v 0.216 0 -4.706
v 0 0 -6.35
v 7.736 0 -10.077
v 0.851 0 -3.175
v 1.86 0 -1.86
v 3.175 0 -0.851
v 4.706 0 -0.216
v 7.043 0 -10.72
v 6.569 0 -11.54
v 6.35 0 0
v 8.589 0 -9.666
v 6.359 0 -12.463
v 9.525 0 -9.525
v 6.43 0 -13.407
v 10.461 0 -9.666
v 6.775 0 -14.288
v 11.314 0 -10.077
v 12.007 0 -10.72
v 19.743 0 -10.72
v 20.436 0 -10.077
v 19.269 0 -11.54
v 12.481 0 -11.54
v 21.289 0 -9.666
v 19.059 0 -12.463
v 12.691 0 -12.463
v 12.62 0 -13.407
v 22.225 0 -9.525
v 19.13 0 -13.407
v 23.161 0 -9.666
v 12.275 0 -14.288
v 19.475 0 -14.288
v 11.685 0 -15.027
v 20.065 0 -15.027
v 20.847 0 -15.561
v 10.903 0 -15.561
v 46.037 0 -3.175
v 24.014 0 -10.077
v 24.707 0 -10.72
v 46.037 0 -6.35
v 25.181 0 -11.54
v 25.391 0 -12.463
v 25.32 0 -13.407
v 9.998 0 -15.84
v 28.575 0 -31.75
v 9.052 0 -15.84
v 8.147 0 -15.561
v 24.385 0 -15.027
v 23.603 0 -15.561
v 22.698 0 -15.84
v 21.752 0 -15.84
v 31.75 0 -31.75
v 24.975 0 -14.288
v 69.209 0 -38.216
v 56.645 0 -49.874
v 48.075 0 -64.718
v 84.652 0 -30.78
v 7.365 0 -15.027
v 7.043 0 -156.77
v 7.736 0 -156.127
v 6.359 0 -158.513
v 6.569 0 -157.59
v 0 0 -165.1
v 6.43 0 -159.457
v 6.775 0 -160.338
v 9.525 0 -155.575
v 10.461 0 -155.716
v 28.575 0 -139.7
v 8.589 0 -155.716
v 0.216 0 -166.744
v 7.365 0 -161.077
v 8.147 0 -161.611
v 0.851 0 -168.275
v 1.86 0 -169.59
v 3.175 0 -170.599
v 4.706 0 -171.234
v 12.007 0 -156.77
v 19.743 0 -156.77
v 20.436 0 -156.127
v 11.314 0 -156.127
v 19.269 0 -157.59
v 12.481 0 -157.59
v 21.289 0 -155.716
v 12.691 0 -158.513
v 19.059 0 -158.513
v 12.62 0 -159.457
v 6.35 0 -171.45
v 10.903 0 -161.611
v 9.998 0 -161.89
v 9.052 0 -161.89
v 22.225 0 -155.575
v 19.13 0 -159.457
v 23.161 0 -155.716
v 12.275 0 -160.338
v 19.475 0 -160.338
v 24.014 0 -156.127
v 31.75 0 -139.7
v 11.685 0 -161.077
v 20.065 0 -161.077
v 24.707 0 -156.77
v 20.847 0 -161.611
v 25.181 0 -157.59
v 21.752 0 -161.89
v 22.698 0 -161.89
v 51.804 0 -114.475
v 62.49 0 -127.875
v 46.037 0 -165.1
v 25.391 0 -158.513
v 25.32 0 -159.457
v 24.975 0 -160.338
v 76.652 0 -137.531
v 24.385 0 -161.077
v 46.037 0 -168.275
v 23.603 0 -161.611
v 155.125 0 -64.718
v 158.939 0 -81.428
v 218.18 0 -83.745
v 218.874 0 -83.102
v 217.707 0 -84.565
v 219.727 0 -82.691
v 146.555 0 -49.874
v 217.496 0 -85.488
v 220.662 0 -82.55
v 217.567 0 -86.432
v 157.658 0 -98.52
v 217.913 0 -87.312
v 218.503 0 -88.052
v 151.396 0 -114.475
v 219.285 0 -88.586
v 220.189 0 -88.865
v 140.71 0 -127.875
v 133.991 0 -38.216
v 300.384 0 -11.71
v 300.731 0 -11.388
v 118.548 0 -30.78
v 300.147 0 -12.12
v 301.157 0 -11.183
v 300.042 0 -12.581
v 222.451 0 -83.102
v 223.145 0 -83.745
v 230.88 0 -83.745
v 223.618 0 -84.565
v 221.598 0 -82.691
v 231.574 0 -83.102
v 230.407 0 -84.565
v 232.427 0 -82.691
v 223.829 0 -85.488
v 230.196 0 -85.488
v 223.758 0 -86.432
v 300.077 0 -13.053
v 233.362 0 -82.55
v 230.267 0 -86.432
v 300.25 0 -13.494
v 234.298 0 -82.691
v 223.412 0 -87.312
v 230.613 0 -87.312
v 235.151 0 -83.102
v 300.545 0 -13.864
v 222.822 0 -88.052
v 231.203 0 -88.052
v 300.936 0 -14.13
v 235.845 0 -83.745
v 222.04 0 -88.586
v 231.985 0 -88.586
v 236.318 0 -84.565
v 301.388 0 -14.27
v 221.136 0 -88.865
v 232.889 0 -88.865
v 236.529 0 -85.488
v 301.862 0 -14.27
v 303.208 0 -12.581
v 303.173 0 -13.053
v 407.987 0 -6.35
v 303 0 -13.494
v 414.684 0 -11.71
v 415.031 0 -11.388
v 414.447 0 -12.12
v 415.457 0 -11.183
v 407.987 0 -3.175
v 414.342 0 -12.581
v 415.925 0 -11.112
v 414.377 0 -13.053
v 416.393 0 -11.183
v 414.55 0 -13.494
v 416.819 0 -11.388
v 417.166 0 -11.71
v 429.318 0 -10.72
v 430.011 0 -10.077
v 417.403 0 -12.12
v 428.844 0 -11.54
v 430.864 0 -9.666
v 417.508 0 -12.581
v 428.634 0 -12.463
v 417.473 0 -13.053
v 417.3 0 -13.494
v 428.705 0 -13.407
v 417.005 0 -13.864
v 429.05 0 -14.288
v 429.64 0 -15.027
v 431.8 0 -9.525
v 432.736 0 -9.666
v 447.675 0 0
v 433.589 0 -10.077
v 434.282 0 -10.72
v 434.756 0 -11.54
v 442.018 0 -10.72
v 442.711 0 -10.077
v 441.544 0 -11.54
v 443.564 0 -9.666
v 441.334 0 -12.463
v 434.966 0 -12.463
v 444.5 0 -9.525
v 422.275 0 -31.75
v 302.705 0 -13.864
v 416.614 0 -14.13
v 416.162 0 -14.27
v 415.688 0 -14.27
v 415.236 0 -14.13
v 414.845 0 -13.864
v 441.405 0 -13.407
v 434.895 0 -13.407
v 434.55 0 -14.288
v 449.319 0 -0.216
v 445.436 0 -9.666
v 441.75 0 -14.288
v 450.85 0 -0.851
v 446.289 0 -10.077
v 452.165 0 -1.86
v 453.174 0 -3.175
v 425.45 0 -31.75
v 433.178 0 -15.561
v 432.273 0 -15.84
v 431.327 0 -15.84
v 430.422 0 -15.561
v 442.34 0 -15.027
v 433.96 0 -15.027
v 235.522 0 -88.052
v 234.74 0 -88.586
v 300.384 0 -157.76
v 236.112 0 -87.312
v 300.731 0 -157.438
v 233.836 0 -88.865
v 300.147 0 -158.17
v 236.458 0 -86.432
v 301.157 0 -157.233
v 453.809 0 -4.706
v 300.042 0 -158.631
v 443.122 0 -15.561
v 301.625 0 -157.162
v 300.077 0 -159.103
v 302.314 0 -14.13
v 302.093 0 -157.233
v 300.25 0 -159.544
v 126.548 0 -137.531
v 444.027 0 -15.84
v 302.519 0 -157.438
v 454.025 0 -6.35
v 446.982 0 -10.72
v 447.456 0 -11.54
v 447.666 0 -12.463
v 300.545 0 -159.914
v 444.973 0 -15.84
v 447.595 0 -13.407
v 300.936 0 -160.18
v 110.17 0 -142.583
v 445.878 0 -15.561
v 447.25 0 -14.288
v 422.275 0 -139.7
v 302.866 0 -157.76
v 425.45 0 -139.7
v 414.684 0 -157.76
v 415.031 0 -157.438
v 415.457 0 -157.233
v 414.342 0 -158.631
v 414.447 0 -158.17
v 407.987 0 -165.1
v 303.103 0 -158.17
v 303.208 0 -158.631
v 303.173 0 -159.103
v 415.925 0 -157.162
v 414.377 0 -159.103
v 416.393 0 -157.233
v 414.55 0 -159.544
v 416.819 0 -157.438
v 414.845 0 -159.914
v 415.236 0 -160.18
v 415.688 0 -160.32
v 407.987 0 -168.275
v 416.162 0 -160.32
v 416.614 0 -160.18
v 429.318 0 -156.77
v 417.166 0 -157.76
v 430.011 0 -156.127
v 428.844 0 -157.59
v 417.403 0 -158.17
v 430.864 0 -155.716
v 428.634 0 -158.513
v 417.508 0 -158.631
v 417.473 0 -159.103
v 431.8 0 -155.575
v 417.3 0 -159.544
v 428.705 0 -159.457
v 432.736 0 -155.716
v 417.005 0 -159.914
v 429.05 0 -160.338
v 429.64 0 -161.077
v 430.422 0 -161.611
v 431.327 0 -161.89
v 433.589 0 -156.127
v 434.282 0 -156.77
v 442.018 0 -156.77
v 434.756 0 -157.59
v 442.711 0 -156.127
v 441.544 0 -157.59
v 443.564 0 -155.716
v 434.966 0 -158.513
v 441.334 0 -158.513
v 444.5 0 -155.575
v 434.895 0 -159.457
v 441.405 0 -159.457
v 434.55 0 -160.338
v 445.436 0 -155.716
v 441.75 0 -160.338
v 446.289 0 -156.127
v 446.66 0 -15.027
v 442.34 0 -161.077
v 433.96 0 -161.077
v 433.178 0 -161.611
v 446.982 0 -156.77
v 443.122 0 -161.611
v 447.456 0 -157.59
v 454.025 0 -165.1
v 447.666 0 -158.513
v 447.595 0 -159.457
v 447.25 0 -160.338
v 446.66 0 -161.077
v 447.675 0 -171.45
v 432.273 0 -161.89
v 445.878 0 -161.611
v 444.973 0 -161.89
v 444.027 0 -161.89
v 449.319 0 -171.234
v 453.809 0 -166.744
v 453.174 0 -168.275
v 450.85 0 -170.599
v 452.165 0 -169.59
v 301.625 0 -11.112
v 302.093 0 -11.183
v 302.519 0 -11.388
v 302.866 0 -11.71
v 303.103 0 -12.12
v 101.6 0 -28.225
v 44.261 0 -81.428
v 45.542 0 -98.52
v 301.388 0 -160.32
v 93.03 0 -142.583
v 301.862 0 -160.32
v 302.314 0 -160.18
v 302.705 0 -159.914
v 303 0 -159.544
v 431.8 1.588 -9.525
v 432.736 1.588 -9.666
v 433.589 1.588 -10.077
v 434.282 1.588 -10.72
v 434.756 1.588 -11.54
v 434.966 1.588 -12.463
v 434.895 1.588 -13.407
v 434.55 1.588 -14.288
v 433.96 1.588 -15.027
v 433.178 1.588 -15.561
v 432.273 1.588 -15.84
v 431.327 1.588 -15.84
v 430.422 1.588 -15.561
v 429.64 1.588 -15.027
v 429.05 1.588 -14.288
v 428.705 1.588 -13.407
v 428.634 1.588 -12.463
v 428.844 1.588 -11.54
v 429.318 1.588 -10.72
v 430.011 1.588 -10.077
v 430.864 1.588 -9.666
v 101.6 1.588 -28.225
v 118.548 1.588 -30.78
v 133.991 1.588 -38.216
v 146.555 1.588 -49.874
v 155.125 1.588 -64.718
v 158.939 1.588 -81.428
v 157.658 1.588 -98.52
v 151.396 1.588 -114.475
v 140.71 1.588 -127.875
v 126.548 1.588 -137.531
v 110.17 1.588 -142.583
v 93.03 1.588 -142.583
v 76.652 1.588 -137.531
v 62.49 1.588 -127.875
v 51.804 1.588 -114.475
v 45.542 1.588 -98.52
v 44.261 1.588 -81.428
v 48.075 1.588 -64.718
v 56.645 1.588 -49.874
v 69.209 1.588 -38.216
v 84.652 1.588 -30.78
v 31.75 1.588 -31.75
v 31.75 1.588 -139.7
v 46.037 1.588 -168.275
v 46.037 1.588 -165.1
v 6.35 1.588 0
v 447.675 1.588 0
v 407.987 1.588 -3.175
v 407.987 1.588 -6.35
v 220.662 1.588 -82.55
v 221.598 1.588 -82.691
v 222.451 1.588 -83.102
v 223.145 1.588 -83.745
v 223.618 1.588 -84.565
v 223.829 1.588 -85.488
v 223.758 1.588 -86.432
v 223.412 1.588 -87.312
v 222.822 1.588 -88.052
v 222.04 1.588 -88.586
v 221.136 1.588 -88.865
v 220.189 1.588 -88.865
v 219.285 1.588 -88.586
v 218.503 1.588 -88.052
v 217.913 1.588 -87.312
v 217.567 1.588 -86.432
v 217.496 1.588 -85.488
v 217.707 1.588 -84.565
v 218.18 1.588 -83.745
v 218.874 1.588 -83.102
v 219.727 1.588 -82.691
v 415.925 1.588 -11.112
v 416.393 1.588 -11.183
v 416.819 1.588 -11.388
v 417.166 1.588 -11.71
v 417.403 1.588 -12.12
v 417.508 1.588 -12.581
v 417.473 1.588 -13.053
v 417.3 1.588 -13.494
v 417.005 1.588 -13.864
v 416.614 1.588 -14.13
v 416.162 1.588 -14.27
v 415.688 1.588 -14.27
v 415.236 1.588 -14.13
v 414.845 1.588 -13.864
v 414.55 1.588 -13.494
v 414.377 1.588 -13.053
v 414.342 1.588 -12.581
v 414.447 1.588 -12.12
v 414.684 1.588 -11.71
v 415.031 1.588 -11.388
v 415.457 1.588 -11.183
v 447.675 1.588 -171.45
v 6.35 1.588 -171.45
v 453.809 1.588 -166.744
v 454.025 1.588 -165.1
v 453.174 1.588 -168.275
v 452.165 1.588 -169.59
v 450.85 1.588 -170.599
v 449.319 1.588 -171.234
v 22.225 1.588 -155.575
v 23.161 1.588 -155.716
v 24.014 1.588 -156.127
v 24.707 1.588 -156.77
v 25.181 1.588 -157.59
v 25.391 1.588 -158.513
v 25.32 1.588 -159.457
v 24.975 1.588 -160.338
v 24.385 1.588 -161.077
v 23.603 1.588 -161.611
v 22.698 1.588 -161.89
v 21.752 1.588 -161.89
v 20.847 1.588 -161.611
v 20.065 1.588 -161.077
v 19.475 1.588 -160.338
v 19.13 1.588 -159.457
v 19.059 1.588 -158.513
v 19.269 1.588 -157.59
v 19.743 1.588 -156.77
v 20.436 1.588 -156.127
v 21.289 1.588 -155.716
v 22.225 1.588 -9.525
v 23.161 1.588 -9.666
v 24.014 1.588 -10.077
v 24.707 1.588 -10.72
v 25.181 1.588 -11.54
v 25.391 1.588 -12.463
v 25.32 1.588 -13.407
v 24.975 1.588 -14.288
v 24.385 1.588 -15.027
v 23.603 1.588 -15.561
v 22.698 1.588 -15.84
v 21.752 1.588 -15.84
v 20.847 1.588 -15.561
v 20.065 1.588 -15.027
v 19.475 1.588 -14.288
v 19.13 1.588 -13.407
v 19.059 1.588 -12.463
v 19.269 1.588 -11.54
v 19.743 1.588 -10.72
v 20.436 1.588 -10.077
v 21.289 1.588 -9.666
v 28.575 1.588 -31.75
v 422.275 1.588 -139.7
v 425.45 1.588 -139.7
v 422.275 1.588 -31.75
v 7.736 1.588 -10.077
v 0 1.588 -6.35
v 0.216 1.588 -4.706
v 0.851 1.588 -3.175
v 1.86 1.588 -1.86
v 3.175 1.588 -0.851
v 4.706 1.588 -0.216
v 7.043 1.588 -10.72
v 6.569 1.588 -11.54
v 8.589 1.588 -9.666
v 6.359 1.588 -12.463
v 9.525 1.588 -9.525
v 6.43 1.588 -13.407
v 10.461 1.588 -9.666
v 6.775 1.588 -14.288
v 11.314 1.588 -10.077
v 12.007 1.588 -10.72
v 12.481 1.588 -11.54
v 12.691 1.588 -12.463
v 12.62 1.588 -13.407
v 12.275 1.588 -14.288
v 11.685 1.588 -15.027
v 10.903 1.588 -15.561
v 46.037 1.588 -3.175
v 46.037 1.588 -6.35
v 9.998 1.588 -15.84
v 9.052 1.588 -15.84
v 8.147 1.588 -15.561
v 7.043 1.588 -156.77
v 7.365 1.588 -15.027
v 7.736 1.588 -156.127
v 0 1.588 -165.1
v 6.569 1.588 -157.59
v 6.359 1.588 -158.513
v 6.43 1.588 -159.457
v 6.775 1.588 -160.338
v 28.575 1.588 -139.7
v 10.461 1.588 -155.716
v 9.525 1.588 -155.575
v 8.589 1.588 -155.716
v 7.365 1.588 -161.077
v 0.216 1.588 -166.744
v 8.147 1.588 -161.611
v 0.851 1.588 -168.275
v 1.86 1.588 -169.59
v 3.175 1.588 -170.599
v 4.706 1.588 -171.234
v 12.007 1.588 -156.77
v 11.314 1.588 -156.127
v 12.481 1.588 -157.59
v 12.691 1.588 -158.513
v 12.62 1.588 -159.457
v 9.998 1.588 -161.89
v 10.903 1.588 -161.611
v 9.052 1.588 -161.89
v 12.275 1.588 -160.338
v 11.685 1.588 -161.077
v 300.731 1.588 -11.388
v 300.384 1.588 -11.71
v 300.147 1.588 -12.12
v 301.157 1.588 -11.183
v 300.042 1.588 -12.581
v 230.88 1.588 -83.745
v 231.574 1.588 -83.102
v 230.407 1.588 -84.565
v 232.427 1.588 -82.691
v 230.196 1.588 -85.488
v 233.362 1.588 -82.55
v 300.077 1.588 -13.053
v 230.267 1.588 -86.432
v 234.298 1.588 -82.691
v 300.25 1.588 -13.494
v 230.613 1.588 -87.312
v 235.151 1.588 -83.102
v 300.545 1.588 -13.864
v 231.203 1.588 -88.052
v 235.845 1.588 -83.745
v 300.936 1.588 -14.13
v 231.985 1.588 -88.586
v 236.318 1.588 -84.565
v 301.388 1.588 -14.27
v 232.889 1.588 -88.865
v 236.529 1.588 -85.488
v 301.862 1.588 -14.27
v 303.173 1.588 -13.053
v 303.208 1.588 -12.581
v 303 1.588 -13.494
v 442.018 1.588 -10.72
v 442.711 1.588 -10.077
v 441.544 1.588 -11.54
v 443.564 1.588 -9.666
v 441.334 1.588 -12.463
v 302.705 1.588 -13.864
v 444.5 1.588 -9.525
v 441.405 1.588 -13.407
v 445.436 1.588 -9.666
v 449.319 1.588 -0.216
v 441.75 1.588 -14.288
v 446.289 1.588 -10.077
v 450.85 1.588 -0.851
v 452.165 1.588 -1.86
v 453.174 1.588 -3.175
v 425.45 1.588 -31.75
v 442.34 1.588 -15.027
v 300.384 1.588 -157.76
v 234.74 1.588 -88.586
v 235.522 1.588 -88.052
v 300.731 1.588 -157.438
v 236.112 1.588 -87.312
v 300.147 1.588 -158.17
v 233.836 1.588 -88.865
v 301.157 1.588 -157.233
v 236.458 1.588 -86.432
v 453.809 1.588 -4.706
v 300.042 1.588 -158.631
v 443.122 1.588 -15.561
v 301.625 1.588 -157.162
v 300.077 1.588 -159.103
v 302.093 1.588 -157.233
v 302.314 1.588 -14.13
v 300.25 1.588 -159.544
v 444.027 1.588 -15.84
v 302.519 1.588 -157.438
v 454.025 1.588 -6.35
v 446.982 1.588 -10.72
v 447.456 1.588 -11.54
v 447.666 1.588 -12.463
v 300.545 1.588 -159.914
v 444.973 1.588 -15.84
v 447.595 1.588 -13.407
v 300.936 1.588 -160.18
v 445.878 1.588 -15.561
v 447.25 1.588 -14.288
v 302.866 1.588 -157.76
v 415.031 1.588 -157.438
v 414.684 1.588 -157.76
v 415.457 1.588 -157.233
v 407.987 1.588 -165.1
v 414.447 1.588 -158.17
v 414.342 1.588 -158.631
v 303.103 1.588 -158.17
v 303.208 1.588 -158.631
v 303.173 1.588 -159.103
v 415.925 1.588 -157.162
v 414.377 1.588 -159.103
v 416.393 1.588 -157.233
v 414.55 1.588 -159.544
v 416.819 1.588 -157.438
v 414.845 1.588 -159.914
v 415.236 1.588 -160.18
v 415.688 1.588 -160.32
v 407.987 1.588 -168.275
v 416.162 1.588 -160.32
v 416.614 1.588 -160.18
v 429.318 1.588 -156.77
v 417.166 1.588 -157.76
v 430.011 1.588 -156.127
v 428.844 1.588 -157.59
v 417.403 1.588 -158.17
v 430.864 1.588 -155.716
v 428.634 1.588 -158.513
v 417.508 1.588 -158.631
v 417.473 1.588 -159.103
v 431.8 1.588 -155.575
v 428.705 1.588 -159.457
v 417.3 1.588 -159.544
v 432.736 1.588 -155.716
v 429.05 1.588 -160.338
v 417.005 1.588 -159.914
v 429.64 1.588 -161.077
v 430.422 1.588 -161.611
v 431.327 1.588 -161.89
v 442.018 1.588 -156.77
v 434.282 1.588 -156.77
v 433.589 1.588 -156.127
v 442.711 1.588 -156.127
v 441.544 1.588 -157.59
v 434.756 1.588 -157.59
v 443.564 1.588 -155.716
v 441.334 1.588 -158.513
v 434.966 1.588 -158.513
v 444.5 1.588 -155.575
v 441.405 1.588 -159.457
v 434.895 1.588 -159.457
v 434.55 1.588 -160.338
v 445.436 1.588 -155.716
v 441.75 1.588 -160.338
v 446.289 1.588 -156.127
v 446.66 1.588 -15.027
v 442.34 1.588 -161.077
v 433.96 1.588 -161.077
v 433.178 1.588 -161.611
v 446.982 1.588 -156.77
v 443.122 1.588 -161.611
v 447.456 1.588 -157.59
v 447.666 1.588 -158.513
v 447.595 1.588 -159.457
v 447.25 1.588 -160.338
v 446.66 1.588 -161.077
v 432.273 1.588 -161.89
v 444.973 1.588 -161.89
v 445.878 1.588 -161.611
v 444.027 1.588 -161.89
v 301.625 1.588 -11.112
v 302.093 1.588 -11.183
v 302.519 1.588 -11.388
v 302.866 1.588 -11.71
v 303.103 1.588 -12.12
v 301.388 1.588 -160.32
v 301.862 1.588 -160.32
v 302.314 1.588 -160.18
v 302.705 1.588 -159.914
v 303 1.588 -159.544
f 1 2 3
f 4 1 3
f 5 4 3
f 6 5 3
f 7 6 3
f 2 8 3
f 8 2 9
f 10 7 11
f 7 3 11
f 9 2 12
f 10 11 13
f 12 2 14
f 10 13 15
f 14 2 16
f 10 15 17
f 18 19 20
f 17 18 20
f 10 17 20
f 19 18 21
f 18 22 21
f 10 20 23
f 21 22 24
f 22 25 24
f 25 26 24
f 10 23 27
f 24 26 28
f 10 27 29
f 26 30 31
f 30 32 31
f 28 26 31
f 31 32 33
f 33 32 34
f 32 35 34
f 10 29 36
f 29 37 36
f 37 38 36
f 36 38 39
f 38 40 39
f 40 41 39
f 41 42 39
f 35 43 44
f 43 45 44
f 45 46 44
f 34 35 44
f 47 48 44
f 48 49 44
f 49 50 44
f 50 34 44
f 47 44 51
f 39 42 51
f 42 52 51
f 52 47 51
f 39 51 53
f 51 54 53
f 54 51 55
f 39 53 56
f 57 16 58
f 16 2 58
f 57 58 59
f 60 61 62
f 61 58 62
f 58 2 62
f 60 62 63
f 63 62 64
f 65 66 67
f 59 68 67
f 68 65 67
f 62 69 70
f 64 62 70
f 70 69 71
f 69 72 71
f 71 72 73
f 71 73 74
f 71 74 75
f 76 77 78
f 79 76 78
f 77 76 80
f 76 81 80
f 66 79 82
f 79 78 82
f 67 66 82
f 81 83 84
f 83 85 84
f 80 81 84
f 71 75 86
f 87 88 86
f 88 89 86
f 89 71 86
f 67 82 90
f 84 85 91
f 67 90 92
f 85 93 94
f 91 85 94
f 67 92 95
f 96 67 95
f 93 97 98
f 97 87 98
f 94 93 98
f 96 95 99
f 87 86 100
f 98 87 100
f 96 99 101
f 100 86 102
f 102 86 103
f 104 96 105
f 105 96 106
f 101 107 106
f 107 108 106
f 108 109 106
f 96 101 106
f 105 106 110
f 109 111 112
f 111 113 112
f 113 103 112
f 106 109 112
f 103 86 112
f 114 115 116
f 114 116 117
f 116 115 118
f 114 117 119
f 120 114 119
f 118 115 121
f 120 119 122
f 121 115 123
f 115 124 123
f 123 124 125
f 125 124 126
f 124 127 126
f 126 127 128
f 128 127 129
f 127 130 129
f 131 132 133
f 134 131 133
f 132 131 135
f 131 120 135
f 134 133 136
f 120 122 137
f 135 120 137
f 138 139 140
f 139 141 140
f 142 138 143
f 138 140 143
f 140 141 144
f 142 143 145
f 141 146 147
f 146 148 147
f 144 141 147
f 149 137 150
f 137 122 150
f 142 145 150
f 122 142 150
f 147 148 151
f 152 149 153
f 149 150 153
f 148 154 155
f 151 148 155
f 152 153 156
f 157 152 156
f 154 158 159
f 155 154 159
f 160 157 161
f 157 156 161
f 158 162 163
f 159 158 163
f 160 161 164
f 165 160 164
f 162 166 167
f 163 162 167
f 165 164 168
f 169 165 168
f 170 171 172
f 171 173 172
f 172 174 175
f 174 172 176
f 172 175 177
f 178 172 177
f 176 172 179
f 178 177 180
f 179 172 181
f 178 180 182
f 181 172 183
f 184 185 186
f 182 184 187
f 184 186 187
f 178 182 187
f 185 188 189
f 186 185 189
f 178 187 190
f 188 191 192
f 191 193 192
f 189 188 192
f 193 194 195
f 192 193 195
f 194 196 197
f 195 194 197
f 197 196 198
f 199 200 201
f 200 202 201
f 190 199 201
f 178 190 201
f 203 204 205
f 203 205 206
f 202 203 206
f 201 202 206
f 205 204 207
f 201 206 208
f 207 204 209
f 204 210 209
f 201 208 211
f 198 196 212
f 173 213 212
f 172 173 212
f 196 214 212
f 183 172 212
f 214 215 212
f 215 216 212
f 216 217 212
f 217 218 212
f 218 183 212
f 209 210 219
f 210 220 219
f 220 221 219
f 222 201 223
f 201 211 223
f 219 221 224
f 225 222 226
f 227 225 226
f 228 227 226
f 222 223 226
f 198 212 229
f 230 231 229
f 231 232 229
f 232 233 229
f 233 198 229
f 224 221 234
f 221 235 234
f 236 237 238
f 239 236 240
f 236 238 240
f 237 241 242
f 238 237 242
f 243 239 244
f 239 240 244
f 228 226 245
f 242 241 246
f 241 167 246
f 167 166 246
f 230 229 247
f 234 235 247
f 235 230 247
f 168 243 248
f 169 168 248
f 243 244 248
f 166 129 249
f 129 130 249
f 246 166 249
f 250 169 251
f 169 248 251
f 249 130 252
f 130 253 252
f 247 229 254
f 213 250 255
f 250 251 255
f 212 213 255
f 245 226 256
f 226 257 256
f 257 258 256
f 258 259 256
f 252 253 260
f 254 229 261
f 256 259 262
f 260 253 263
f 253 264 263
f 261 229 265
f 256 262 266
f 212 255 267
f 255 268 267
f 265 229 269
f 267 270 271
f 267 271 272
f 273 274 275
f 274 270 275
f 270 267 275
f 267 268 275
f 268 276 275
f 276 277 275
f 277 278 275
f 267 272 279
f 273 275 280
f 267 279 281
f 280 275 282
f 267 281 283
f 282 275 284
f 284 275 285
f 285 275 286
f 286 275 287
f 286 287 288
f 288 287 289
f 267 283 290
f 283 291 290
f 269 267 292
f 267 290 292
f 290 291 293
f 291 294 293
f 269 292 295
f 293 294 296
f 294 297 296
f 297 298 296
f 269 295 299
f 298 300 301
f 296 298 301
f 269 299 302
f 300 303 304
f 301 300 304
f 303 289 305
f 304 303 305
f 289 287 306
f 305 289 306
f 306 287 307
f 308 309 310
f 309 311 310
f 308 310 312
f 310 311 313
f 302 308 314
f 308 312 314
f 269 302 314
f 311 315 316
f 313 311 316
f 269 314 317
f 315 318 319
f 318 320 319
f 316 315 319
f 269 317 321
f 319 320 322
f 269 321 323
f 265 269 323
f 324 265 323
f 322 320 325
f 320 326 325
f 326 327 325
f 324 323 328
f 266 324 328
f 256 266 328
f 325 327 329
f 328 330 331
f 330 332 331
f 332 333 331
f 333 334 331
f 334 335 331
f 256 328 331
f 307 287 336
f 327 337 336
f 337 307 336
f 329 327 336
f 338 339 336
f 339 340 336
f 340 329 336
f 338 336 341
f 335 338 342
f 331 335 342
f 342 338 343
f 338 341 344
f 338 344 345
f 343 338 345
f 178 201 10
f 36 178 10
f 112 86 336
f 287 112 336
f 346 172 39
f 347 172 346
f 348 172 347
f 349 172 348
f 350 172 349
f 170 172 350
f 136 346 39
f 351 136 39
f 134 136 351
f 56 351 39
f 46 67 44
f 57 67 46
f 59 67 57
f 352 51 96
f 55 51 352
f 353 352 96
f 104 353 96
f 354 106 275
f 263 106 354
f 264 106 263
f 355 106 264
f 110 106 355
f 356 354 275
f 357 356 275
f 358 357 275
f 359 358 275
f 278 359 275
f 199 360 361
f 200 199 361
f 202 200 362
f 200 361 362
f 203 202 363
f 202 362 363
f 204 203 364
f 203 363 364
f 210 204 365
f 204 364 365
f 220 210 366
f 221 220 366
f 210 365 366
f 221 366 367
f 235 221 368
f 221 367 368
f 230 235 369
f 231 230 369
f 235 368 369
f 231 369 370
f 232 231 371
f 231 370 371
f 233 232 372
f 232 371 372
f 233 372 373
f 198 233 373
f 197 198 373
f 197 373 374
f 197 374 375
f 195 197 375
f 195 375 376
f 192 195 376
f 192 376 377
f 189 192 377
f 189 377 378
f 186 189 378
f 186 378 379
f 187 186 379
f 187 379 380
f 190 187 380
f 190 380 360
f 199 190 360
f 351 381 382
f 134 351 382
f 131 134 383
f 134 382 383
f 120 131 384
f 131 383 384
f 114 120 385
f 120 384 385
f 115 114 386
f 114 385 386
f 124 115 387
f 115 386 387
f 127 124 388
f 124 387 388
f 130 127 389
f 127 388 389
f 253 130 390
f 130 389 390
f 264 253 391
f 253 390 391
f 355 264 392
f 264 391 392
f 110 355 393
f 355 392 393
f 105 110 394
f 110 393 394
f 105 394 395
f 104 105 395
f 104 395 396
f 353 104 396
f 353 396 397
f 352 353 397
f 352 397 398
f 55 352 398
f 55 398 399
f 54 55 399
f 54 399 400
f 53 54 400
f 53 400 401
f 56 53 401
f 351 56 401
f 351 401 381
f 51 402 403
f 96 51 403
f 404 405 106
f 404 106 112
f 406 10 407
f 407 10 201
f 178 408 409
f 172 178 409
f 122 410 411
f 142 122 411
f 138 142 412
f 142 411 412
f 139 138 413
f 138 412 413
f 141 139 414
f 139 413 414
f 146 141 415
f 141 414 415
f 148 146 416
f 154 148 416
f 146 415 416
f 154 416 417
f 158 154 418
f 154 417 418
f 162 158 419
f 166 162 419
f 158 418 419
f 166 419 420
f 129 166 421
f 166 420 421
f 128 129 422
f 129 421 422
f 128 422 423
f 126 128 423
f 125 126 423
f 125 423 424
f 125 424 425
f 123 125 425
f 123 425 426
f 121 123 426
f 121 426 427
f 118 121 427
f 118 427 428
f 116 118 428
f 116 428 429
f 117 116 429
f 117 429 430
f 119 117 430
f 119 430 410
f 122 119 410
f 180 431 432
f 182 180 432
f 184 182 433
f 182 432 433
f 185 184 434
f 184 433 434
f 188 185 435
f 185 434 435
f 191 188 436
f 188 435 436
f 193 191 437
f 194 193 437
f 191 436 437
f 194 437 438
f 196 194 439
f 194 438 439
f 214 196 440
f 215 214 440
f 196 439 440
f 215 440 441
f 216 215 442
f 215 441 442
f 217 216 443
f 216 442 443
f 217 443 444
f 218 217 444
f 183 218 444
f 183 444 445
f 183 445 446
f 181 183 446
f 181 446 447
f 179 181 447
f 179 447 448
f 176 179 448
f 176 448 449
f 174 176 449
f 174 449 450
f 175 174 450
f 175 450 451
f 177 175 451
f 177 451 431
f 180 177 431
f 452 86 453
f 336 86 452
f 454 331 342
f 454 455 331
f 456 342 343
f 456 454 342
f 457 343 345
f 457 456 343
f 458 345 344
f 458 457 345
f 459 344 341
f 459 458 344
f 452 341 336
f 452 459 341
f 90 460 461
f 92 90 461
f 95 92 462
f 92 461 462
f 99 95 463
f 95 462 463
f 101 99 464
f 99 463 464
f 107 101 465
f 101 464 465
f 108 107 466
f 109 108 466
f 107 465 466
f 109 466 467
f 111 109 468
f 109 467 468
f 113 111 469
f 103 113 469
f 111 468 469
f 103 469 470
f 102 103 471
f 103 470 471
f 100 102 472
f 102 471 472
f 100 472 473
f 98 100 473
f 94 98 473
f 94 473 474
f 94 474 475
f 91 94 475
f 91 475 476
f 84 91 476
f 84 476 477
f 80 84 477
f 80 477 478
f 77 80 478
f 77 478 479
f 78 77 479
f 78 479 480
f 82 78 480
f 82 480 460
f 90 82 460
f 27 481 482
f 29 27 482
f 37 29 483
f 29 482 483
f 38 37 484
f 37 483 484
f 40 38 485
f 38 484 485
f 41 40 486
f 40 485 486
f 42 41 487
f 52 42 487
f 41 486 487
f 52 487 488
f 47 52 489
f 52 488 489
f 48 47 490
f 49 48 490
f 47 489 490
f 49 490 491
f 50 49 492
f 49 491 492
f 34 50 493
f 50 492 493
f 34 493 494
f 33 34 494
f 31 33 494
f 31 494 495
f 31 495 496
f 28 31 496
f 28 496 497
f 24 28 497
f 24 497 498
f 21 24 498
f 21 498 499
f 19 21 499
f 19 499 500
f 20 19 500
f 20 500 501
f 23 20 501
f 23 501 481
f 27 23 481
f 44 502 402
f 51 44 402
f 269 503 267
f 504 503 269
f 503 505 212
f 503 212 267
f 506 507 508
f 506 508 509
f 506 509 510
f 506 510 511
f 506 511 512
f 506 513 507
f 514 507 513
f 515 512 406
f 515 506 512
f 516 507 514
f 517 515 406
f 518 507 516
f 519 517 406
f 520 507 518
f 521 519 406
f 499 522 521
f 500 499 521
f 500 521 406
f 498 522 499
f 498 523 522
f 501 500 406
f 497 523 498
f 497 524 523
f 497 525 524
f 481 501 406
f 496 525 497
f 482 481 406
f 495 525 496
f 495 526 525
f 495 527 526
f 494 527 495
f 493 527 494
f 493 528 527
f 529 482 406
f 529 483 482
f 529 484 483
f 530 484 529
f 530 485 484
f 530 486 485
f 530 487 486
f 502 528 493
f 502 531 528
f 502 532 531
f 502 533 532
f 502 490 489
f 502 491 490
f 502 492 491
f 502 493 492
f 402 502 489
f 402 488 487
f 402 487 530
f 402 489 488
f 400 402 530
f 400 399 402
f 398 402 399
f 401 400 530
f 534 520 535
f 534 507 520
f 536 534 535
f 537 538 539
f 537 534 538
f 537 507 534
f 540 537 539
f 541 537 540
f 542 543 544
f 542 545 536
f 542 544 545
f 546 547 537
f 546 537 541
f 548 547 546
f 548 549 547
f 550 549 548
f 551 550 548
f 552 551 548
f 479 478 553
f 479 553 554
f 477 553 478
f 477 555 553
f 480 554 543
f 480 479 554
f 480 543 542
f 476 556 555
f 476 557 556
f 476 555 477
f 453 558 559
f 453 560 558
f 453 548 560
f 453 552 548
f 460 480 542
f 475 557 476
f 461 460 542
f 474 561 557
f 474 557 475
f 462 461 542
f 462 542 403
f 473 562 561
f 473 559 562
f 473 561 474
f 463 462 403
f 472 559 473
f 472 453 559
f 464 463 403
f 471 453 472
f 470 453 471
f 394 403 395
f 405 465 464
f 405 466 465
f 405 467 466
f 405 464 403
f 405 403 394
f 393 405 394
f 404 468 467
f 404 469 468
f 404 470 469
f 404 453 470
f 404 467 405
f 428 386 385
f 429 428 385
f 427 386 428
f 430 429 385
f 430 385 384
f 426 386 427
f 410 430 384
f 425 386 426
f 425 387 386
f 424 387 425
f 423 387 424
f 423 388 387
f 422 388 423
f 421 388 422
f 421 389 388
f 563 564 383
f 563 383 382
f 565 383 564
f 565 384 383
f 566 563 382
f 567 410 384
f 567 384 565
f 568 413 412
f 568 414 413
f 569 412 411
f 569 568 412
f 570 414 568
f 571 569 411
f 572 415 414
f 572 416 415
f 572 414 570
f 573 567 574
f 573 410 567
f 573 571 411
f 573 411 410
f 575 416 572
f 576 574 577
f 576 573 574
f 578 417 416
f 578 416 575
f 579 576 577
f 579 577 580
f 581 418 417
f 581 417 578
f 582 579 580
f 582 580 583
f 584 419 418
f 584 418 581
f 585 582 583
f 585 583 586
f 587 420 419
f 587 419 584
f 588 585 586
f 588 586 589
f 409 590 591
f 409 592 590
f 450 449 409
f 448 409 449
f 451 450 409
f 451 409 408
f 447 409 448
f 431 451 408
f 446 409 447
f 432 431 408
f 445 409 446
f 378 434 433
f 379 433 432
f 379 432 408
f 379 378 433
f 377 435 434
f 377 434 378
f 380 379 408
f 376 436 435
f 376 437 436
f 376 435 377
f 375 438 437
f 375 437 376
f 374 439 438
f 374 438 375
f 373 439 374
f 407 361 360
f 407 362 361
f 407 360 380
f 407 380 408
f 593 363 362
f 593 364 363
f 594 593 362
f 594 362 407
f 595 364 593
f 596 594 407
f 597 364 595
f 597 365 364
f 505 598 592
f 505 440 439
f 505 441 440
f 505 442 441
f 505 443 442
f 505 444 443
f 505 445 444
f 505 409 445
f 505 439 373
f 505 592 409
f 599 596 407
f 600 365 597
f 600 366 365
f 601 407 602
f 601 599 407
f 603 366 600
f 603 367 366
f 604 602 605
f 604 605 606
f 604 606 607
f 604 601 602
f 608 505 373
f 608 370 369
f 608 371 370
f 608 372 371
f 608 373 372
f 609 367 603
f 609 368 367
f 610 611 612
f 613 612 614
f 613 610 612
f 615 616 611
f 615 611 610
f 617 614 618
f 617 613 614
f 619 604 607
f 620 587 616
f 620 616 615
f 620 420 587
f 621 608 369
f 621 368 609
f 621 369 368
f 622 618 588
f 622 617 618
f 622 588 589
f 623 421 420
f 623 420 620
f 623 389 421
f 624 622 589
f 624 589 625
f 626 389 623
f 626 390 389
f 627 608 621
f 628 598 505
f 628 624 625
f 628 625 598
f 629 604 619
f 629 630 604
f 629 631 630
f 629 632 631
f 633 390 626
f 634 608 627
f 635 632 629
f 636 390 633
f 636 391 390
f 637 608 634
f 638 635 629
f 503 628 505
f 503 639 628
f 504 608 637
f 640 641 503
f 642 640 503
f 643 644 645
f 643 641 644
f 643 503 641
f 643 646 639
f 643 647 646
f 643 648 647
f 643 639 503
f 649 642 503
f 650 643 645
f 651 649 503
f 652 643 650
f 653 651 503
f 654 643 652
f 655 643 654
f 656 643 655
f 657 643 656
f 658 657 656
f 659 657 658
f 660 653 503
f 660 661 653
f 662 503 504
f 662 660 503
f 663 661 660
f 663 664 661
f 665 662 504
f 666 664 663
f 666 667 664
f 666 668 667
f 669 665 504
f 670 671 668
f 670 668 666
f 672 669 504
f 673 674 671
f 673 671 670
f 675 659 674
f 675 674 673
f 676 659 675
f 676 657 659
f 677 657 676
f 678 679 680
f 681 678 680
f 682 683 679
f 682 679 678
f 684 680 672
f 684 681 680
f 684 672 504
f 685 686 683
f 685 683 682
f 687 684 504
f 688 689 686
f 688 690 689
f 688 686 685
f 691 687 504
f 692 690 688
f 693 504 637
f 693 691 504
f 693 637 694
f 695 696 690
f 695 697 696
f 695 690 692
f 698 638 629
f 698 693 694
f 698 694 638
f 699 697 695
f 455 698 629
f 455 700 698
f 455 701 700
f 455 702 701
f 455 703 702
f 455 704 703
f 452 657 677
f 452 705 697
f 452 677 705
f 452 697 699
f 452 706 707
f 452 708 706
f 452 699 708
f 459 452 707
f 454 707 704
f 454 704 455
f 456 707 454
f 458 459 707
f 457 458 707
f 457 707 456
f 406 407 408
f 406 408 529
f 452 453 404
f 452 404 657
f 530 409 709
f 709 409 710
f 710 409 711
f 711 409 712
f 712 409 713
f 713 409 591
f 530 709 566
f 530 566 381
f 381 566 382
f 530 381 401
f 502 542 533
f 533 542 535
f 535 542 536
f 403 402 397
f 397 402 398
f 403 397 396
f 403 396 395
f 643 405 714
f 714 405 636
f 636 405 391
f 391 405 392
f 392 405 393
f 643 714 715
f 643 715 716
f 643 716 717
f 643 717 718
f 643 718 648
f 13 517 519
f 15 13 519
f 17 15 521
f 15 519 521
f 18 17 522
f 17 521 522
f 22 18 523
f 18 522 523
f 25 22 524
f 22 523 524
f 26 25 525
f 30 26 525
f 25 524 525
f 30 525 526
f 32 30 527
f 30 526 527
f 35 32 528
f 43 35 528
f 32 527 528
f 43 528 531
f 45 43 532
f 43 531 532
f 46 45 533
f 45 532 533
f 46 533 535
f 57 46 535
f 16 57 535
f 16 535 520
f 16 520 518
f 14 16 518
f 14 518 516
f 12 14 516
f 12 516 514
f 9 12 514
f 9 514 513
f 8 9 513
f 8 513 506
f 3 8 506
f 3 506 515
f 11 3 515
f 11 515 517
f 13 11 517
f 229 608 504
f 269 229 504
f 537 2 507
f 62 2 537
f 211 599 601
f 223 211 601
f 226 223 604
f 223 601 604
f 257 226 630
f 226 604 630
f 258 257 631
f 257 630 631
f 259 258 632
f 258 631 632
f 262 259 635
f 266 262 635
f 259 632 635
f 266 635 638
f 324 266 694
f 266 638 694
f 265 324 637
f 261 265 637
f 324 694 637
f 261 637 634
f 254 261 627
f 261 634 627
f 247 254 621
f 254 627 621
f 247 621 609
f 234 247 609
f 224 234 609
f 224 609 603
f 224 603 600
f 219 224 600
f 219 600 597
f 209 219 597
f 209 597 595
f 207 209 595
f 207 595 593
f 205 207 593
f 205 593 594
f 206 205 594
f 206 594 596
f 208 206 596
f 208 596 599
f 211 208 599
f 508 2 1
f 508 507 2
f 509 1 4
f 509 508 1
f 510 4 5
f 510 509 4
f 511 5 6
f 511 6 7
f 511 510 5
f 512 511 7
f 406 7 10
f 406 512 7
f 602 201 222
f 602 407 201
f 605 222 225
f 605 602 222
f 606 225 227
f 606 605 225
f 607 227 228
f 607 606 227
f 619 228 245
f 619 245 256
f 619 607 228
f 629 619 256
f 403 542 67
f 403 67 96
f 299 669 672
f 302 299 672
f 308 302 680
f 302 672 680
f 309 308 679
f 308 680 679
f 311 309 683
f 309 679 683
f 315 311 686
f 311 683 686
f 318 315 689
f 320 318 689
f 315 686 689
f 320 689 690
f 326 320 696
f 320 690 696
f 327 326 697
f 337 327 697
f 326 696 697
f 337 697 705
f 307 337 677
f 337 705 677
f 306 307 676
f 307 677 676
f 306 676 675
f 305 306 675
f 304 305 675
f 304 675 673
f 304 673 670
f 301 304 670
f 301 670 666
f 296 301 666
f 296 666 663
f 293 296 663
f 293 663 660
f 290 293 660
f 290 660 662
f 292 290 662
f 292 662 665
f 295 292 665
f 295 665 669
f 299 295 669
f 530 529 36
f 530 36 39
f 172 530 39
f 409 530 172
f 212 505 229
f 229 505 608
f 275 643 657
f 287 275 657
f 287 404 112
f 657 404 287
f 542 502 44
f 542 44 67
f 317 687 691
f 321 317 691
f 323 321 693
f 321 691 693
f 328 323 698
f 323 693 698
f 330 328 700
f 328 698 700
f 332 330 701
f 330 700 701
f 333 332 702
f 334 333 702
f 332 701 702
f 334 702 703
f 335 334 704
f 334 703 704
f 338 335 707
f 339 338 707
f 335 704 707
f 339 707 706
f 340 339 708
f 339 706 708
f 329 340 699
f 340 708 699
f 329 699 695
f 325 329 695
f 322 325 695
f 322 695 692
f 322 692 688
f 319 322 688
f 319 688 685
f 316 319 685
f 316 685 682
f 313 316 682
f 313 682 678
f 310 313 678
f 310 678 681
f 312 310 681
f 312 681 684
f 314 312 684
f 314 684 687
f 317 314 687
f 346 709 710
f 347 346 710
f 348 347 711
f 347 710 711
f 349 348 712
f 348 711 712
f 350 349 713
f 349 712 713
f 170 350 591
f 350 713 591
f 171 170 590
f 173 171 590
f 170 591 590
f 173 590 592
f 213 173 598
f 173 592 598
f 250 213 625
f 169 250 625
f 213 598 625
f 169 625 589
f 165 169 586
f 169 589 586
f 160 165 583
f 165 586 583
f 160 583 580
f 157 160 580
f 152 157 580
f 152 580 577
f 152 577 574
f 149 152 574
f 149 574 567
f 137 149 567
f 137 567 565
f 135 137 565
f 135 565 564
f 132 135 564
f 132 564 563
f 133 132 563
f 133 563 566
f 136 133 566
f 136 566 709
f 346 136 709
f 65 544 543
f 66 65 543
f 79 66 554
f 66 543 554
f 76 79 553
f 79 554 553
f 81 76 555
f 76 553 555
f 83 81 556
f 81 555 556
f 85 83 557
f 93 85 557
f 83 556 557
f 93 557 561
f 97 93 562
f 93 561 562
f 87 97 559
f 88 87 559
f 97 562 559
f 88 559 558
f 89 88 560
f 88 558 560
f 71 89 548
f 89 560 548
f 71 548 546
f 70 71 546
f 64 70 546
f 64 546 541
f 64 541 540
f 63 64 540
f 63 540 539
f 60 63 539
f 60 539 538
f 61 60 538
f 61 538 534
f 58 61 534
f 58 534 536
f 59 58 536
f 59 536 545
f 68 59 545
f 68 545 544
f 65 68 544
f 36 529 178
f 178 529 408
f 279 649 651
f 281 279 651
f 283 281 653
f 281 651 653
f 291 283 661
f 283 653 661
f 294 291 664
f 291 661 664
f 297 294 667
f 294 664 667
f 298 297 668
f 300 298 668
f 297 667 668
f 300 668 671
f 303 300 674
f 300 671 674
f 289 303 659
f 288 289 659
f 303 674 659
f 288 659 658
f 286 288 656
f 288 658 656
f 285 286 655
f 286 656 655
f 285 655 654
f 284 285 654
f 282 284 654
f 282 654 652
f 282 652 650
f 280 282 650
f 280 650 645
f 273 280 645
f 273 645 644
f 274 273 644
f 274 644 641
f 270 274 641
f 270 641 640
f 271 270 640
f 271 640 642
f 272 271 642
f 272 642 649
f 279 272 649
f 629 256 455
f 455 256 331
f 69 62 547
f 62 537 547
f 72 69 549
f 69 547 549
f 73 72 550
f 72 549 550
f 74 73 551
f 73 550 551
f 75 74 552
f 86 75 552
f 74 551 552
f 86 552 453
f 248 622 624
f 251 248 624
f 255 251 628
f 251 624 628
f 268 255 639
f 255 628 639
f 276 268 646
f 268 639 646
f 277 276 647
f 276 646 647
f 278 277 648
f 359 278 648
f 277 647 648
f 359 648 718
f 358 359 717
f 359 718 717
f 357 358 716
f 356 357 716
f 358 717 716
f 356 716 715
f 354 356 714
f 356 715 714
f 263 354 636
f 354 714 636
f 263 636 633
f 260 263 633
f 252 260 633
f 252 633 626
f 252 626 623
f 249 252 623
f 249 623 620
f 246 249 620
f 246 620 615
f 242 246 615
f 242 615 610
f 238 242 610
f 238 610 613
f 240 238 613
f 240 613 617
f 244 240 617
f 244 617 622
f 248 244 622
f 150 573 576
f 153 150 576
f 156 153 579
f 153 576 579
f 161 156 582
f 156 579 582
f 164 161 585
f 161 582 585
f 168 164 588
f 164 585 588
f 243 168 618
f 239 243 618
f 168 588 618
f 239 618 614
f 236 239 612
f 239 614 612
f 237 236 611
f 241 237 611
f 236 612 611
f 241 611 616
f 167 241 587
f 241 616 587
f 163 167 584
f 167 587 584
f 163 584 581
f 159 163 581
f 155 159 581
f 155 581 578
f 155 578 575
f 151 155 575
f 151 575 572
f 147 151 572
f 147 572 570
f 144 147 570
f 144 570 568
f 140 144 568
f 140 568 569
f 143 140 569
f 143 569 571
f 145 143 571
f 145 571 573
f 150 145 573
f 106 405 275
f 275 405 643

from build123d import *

# Parameters (mm, degrees)
SKETCH1_W           = 454.025
SKETCH1_H           = 171.45
BOSS_EXTRUDE1_DEPTH = 1.5875
FILLET1_R           = 6.35
SKETCH3_W           = 361.95
SKETCH3_H           = 3.175
SKETCH3_W_2         = 3.175
SKETCH3_H_2         = 107.95
CUT_EXTRUDE1_DEPTH  = 486.320845711
SKETCH4_R           = 3.175
CUT_EXTRUDE2_DEPTH  = 486.320845711
SKETCH6_R           = 1.5875
CUT_EXTRUDE3_DEPTH  = 486.320845711
SKETCH7_R           = 57.5
CUT_EXTRUDE4_DEPTH  = 486.320845711


with BuildPart() as part:
    # Sketch1 → Boss-Extrude1 (new body)
    with BuildSketch(Plane(origin=(0, 0, 0), x_dir=(1, 0, 0), z_dir=(0, 1, 0))):
        with Locations((227.0125, 85.725)):
            Rectangle(SKETCH1_W, SKETCH1_H)
    extrude(amount=BOSS_EXTRUDE1_DEPTH)

    # Fillet1
    fillet1_edges = [part.edges().sort_by_distance(p)[0] for p in [
        (0, 0.79375, -171.45),
        (454.025, 0.79375, -171.45),
        (454.025, 0.79375, 0),
        (0, 0.79375, 0),
    ]]
    fillet(fillet1_edges, radius=FILLET1_R)

    # Sketch3 → Cut-Extrude1 (cut, through all)
    with BuildSketch(Plane(origin=(0, 1.5875, 0), x_dir=(1, 0, 0), z_dir=(0, 1, 0))):
        with Locations((227.0125, 166.6875)):
            Rectangle(SKETCH3_W, SKETCH3_H)
        with Locations((30.1625, 85.725)):
            Rectangle(SKETCH3_W_2, SKETCH3_H_2)
        with Locations((227.0125, 4.7625)):
            Rectangle(SKETCH3_W, SKETCH3_H)
        with Locations((423.8625, 85.725)):
            Rectangle(SKETCH3_W_2, SKETCH3_H_2)
    extrude(amount=-CUT_EXTRUDE1_DEPTH, mode=Mode.SUBTRACT)

    # Sketch4 → Cut-Extrude2 (cut, through all)
    with BuildSketch(Plane(origin=(0, 1.5875, 0), x_dir=(1, 0, 0), z_dir=(0, 1, 0))):
        with Locations(Location((9.525, 158.75, 0), (0, 0, 270))):
            Circle(SKETCH4_R)
        with Locations(Location((22.225, 158.75, 0), (0, 0, 270))):
            Circle(SKETCH4_R)
        with Locations(Location((431.8, 158.75, 0), (0, 0, 270))):
            Circle(SKETCH4_R)
        with Locations(Location((444.5, 158.75, 0), (0, 0, 270))):
            Circle(SKETCH4_R)
        with Locations(Location((431.8, 12.7, 0), (0, 0, 270))):
            Circle(SKETCH4_R)
        with Locations(Location((444.5, 12.7, 0), (0, 0, 270))):
            Circle(SKETCH4_R)
        with Locations(Location((9.525, 12.7, 0), (0, 0, 270))):
            Circle(SKETCH4_R)
        with Locations(Location((22.225, 12.7, 0), (0, 0, 270))):
            Circle(SKETCH4_R)
        with Locations(Location((220.6625, 85.725, 0), (0, 0, 270))):
            Circle(SKETCH4_R)
        with Locations(Location((233.3625, 85.725, 0), (0, 0, 270))):
            Circle(SKETCH4_R)
    extrude(amount=-CUT_EXTRUDE2_DEPTH, mode=Mode.SUBTRACT)

    # Sketch6 → Cut-Extrude3 (cut, through all)
    with BuildSketch(Plane(origin=(0, 1.5875, 0), x_dir=(1, 0, 0), z_dir=(0, 1, 0))):
        with Locations(Location((301.625, 158.75, 0), (0, 0, 270))):
            Circle(SKETCH6_R)
        with Locations(Location((415.925, 158.75, 0), (0, 0, 270))):
            Circle(SKETCH6_R)
        with Locations(Location((415.925, 12.7, 0), (0, 0, 270))):
            Circle(SKETCH6_R)
        with Locations(Location((301.625, 12.7, 0), (0, 0, 270))):
            Circle(SKETCH6_R)
    extrude(amount=-CUT_EXTRUDE3_DEPTH, mode=Mode.SUBTRACT)

    # Sketch7 → Cut-Extrude4 (cut, through all)
    with BuildSketch(Plane(origin=(0, 1.5875, 0), x_dir=(1, 0, 0), z_dir=(0, 1, 0))):
        with Locations(Location((101.6, 85.725, 0), (0, 0, 270))):
            Circle(SKETCH7_R)
    extrude(amount=-CUT_EXTRUDE4_DEPTH, mode=Mode.SUBTRACT)


solid = part.part
